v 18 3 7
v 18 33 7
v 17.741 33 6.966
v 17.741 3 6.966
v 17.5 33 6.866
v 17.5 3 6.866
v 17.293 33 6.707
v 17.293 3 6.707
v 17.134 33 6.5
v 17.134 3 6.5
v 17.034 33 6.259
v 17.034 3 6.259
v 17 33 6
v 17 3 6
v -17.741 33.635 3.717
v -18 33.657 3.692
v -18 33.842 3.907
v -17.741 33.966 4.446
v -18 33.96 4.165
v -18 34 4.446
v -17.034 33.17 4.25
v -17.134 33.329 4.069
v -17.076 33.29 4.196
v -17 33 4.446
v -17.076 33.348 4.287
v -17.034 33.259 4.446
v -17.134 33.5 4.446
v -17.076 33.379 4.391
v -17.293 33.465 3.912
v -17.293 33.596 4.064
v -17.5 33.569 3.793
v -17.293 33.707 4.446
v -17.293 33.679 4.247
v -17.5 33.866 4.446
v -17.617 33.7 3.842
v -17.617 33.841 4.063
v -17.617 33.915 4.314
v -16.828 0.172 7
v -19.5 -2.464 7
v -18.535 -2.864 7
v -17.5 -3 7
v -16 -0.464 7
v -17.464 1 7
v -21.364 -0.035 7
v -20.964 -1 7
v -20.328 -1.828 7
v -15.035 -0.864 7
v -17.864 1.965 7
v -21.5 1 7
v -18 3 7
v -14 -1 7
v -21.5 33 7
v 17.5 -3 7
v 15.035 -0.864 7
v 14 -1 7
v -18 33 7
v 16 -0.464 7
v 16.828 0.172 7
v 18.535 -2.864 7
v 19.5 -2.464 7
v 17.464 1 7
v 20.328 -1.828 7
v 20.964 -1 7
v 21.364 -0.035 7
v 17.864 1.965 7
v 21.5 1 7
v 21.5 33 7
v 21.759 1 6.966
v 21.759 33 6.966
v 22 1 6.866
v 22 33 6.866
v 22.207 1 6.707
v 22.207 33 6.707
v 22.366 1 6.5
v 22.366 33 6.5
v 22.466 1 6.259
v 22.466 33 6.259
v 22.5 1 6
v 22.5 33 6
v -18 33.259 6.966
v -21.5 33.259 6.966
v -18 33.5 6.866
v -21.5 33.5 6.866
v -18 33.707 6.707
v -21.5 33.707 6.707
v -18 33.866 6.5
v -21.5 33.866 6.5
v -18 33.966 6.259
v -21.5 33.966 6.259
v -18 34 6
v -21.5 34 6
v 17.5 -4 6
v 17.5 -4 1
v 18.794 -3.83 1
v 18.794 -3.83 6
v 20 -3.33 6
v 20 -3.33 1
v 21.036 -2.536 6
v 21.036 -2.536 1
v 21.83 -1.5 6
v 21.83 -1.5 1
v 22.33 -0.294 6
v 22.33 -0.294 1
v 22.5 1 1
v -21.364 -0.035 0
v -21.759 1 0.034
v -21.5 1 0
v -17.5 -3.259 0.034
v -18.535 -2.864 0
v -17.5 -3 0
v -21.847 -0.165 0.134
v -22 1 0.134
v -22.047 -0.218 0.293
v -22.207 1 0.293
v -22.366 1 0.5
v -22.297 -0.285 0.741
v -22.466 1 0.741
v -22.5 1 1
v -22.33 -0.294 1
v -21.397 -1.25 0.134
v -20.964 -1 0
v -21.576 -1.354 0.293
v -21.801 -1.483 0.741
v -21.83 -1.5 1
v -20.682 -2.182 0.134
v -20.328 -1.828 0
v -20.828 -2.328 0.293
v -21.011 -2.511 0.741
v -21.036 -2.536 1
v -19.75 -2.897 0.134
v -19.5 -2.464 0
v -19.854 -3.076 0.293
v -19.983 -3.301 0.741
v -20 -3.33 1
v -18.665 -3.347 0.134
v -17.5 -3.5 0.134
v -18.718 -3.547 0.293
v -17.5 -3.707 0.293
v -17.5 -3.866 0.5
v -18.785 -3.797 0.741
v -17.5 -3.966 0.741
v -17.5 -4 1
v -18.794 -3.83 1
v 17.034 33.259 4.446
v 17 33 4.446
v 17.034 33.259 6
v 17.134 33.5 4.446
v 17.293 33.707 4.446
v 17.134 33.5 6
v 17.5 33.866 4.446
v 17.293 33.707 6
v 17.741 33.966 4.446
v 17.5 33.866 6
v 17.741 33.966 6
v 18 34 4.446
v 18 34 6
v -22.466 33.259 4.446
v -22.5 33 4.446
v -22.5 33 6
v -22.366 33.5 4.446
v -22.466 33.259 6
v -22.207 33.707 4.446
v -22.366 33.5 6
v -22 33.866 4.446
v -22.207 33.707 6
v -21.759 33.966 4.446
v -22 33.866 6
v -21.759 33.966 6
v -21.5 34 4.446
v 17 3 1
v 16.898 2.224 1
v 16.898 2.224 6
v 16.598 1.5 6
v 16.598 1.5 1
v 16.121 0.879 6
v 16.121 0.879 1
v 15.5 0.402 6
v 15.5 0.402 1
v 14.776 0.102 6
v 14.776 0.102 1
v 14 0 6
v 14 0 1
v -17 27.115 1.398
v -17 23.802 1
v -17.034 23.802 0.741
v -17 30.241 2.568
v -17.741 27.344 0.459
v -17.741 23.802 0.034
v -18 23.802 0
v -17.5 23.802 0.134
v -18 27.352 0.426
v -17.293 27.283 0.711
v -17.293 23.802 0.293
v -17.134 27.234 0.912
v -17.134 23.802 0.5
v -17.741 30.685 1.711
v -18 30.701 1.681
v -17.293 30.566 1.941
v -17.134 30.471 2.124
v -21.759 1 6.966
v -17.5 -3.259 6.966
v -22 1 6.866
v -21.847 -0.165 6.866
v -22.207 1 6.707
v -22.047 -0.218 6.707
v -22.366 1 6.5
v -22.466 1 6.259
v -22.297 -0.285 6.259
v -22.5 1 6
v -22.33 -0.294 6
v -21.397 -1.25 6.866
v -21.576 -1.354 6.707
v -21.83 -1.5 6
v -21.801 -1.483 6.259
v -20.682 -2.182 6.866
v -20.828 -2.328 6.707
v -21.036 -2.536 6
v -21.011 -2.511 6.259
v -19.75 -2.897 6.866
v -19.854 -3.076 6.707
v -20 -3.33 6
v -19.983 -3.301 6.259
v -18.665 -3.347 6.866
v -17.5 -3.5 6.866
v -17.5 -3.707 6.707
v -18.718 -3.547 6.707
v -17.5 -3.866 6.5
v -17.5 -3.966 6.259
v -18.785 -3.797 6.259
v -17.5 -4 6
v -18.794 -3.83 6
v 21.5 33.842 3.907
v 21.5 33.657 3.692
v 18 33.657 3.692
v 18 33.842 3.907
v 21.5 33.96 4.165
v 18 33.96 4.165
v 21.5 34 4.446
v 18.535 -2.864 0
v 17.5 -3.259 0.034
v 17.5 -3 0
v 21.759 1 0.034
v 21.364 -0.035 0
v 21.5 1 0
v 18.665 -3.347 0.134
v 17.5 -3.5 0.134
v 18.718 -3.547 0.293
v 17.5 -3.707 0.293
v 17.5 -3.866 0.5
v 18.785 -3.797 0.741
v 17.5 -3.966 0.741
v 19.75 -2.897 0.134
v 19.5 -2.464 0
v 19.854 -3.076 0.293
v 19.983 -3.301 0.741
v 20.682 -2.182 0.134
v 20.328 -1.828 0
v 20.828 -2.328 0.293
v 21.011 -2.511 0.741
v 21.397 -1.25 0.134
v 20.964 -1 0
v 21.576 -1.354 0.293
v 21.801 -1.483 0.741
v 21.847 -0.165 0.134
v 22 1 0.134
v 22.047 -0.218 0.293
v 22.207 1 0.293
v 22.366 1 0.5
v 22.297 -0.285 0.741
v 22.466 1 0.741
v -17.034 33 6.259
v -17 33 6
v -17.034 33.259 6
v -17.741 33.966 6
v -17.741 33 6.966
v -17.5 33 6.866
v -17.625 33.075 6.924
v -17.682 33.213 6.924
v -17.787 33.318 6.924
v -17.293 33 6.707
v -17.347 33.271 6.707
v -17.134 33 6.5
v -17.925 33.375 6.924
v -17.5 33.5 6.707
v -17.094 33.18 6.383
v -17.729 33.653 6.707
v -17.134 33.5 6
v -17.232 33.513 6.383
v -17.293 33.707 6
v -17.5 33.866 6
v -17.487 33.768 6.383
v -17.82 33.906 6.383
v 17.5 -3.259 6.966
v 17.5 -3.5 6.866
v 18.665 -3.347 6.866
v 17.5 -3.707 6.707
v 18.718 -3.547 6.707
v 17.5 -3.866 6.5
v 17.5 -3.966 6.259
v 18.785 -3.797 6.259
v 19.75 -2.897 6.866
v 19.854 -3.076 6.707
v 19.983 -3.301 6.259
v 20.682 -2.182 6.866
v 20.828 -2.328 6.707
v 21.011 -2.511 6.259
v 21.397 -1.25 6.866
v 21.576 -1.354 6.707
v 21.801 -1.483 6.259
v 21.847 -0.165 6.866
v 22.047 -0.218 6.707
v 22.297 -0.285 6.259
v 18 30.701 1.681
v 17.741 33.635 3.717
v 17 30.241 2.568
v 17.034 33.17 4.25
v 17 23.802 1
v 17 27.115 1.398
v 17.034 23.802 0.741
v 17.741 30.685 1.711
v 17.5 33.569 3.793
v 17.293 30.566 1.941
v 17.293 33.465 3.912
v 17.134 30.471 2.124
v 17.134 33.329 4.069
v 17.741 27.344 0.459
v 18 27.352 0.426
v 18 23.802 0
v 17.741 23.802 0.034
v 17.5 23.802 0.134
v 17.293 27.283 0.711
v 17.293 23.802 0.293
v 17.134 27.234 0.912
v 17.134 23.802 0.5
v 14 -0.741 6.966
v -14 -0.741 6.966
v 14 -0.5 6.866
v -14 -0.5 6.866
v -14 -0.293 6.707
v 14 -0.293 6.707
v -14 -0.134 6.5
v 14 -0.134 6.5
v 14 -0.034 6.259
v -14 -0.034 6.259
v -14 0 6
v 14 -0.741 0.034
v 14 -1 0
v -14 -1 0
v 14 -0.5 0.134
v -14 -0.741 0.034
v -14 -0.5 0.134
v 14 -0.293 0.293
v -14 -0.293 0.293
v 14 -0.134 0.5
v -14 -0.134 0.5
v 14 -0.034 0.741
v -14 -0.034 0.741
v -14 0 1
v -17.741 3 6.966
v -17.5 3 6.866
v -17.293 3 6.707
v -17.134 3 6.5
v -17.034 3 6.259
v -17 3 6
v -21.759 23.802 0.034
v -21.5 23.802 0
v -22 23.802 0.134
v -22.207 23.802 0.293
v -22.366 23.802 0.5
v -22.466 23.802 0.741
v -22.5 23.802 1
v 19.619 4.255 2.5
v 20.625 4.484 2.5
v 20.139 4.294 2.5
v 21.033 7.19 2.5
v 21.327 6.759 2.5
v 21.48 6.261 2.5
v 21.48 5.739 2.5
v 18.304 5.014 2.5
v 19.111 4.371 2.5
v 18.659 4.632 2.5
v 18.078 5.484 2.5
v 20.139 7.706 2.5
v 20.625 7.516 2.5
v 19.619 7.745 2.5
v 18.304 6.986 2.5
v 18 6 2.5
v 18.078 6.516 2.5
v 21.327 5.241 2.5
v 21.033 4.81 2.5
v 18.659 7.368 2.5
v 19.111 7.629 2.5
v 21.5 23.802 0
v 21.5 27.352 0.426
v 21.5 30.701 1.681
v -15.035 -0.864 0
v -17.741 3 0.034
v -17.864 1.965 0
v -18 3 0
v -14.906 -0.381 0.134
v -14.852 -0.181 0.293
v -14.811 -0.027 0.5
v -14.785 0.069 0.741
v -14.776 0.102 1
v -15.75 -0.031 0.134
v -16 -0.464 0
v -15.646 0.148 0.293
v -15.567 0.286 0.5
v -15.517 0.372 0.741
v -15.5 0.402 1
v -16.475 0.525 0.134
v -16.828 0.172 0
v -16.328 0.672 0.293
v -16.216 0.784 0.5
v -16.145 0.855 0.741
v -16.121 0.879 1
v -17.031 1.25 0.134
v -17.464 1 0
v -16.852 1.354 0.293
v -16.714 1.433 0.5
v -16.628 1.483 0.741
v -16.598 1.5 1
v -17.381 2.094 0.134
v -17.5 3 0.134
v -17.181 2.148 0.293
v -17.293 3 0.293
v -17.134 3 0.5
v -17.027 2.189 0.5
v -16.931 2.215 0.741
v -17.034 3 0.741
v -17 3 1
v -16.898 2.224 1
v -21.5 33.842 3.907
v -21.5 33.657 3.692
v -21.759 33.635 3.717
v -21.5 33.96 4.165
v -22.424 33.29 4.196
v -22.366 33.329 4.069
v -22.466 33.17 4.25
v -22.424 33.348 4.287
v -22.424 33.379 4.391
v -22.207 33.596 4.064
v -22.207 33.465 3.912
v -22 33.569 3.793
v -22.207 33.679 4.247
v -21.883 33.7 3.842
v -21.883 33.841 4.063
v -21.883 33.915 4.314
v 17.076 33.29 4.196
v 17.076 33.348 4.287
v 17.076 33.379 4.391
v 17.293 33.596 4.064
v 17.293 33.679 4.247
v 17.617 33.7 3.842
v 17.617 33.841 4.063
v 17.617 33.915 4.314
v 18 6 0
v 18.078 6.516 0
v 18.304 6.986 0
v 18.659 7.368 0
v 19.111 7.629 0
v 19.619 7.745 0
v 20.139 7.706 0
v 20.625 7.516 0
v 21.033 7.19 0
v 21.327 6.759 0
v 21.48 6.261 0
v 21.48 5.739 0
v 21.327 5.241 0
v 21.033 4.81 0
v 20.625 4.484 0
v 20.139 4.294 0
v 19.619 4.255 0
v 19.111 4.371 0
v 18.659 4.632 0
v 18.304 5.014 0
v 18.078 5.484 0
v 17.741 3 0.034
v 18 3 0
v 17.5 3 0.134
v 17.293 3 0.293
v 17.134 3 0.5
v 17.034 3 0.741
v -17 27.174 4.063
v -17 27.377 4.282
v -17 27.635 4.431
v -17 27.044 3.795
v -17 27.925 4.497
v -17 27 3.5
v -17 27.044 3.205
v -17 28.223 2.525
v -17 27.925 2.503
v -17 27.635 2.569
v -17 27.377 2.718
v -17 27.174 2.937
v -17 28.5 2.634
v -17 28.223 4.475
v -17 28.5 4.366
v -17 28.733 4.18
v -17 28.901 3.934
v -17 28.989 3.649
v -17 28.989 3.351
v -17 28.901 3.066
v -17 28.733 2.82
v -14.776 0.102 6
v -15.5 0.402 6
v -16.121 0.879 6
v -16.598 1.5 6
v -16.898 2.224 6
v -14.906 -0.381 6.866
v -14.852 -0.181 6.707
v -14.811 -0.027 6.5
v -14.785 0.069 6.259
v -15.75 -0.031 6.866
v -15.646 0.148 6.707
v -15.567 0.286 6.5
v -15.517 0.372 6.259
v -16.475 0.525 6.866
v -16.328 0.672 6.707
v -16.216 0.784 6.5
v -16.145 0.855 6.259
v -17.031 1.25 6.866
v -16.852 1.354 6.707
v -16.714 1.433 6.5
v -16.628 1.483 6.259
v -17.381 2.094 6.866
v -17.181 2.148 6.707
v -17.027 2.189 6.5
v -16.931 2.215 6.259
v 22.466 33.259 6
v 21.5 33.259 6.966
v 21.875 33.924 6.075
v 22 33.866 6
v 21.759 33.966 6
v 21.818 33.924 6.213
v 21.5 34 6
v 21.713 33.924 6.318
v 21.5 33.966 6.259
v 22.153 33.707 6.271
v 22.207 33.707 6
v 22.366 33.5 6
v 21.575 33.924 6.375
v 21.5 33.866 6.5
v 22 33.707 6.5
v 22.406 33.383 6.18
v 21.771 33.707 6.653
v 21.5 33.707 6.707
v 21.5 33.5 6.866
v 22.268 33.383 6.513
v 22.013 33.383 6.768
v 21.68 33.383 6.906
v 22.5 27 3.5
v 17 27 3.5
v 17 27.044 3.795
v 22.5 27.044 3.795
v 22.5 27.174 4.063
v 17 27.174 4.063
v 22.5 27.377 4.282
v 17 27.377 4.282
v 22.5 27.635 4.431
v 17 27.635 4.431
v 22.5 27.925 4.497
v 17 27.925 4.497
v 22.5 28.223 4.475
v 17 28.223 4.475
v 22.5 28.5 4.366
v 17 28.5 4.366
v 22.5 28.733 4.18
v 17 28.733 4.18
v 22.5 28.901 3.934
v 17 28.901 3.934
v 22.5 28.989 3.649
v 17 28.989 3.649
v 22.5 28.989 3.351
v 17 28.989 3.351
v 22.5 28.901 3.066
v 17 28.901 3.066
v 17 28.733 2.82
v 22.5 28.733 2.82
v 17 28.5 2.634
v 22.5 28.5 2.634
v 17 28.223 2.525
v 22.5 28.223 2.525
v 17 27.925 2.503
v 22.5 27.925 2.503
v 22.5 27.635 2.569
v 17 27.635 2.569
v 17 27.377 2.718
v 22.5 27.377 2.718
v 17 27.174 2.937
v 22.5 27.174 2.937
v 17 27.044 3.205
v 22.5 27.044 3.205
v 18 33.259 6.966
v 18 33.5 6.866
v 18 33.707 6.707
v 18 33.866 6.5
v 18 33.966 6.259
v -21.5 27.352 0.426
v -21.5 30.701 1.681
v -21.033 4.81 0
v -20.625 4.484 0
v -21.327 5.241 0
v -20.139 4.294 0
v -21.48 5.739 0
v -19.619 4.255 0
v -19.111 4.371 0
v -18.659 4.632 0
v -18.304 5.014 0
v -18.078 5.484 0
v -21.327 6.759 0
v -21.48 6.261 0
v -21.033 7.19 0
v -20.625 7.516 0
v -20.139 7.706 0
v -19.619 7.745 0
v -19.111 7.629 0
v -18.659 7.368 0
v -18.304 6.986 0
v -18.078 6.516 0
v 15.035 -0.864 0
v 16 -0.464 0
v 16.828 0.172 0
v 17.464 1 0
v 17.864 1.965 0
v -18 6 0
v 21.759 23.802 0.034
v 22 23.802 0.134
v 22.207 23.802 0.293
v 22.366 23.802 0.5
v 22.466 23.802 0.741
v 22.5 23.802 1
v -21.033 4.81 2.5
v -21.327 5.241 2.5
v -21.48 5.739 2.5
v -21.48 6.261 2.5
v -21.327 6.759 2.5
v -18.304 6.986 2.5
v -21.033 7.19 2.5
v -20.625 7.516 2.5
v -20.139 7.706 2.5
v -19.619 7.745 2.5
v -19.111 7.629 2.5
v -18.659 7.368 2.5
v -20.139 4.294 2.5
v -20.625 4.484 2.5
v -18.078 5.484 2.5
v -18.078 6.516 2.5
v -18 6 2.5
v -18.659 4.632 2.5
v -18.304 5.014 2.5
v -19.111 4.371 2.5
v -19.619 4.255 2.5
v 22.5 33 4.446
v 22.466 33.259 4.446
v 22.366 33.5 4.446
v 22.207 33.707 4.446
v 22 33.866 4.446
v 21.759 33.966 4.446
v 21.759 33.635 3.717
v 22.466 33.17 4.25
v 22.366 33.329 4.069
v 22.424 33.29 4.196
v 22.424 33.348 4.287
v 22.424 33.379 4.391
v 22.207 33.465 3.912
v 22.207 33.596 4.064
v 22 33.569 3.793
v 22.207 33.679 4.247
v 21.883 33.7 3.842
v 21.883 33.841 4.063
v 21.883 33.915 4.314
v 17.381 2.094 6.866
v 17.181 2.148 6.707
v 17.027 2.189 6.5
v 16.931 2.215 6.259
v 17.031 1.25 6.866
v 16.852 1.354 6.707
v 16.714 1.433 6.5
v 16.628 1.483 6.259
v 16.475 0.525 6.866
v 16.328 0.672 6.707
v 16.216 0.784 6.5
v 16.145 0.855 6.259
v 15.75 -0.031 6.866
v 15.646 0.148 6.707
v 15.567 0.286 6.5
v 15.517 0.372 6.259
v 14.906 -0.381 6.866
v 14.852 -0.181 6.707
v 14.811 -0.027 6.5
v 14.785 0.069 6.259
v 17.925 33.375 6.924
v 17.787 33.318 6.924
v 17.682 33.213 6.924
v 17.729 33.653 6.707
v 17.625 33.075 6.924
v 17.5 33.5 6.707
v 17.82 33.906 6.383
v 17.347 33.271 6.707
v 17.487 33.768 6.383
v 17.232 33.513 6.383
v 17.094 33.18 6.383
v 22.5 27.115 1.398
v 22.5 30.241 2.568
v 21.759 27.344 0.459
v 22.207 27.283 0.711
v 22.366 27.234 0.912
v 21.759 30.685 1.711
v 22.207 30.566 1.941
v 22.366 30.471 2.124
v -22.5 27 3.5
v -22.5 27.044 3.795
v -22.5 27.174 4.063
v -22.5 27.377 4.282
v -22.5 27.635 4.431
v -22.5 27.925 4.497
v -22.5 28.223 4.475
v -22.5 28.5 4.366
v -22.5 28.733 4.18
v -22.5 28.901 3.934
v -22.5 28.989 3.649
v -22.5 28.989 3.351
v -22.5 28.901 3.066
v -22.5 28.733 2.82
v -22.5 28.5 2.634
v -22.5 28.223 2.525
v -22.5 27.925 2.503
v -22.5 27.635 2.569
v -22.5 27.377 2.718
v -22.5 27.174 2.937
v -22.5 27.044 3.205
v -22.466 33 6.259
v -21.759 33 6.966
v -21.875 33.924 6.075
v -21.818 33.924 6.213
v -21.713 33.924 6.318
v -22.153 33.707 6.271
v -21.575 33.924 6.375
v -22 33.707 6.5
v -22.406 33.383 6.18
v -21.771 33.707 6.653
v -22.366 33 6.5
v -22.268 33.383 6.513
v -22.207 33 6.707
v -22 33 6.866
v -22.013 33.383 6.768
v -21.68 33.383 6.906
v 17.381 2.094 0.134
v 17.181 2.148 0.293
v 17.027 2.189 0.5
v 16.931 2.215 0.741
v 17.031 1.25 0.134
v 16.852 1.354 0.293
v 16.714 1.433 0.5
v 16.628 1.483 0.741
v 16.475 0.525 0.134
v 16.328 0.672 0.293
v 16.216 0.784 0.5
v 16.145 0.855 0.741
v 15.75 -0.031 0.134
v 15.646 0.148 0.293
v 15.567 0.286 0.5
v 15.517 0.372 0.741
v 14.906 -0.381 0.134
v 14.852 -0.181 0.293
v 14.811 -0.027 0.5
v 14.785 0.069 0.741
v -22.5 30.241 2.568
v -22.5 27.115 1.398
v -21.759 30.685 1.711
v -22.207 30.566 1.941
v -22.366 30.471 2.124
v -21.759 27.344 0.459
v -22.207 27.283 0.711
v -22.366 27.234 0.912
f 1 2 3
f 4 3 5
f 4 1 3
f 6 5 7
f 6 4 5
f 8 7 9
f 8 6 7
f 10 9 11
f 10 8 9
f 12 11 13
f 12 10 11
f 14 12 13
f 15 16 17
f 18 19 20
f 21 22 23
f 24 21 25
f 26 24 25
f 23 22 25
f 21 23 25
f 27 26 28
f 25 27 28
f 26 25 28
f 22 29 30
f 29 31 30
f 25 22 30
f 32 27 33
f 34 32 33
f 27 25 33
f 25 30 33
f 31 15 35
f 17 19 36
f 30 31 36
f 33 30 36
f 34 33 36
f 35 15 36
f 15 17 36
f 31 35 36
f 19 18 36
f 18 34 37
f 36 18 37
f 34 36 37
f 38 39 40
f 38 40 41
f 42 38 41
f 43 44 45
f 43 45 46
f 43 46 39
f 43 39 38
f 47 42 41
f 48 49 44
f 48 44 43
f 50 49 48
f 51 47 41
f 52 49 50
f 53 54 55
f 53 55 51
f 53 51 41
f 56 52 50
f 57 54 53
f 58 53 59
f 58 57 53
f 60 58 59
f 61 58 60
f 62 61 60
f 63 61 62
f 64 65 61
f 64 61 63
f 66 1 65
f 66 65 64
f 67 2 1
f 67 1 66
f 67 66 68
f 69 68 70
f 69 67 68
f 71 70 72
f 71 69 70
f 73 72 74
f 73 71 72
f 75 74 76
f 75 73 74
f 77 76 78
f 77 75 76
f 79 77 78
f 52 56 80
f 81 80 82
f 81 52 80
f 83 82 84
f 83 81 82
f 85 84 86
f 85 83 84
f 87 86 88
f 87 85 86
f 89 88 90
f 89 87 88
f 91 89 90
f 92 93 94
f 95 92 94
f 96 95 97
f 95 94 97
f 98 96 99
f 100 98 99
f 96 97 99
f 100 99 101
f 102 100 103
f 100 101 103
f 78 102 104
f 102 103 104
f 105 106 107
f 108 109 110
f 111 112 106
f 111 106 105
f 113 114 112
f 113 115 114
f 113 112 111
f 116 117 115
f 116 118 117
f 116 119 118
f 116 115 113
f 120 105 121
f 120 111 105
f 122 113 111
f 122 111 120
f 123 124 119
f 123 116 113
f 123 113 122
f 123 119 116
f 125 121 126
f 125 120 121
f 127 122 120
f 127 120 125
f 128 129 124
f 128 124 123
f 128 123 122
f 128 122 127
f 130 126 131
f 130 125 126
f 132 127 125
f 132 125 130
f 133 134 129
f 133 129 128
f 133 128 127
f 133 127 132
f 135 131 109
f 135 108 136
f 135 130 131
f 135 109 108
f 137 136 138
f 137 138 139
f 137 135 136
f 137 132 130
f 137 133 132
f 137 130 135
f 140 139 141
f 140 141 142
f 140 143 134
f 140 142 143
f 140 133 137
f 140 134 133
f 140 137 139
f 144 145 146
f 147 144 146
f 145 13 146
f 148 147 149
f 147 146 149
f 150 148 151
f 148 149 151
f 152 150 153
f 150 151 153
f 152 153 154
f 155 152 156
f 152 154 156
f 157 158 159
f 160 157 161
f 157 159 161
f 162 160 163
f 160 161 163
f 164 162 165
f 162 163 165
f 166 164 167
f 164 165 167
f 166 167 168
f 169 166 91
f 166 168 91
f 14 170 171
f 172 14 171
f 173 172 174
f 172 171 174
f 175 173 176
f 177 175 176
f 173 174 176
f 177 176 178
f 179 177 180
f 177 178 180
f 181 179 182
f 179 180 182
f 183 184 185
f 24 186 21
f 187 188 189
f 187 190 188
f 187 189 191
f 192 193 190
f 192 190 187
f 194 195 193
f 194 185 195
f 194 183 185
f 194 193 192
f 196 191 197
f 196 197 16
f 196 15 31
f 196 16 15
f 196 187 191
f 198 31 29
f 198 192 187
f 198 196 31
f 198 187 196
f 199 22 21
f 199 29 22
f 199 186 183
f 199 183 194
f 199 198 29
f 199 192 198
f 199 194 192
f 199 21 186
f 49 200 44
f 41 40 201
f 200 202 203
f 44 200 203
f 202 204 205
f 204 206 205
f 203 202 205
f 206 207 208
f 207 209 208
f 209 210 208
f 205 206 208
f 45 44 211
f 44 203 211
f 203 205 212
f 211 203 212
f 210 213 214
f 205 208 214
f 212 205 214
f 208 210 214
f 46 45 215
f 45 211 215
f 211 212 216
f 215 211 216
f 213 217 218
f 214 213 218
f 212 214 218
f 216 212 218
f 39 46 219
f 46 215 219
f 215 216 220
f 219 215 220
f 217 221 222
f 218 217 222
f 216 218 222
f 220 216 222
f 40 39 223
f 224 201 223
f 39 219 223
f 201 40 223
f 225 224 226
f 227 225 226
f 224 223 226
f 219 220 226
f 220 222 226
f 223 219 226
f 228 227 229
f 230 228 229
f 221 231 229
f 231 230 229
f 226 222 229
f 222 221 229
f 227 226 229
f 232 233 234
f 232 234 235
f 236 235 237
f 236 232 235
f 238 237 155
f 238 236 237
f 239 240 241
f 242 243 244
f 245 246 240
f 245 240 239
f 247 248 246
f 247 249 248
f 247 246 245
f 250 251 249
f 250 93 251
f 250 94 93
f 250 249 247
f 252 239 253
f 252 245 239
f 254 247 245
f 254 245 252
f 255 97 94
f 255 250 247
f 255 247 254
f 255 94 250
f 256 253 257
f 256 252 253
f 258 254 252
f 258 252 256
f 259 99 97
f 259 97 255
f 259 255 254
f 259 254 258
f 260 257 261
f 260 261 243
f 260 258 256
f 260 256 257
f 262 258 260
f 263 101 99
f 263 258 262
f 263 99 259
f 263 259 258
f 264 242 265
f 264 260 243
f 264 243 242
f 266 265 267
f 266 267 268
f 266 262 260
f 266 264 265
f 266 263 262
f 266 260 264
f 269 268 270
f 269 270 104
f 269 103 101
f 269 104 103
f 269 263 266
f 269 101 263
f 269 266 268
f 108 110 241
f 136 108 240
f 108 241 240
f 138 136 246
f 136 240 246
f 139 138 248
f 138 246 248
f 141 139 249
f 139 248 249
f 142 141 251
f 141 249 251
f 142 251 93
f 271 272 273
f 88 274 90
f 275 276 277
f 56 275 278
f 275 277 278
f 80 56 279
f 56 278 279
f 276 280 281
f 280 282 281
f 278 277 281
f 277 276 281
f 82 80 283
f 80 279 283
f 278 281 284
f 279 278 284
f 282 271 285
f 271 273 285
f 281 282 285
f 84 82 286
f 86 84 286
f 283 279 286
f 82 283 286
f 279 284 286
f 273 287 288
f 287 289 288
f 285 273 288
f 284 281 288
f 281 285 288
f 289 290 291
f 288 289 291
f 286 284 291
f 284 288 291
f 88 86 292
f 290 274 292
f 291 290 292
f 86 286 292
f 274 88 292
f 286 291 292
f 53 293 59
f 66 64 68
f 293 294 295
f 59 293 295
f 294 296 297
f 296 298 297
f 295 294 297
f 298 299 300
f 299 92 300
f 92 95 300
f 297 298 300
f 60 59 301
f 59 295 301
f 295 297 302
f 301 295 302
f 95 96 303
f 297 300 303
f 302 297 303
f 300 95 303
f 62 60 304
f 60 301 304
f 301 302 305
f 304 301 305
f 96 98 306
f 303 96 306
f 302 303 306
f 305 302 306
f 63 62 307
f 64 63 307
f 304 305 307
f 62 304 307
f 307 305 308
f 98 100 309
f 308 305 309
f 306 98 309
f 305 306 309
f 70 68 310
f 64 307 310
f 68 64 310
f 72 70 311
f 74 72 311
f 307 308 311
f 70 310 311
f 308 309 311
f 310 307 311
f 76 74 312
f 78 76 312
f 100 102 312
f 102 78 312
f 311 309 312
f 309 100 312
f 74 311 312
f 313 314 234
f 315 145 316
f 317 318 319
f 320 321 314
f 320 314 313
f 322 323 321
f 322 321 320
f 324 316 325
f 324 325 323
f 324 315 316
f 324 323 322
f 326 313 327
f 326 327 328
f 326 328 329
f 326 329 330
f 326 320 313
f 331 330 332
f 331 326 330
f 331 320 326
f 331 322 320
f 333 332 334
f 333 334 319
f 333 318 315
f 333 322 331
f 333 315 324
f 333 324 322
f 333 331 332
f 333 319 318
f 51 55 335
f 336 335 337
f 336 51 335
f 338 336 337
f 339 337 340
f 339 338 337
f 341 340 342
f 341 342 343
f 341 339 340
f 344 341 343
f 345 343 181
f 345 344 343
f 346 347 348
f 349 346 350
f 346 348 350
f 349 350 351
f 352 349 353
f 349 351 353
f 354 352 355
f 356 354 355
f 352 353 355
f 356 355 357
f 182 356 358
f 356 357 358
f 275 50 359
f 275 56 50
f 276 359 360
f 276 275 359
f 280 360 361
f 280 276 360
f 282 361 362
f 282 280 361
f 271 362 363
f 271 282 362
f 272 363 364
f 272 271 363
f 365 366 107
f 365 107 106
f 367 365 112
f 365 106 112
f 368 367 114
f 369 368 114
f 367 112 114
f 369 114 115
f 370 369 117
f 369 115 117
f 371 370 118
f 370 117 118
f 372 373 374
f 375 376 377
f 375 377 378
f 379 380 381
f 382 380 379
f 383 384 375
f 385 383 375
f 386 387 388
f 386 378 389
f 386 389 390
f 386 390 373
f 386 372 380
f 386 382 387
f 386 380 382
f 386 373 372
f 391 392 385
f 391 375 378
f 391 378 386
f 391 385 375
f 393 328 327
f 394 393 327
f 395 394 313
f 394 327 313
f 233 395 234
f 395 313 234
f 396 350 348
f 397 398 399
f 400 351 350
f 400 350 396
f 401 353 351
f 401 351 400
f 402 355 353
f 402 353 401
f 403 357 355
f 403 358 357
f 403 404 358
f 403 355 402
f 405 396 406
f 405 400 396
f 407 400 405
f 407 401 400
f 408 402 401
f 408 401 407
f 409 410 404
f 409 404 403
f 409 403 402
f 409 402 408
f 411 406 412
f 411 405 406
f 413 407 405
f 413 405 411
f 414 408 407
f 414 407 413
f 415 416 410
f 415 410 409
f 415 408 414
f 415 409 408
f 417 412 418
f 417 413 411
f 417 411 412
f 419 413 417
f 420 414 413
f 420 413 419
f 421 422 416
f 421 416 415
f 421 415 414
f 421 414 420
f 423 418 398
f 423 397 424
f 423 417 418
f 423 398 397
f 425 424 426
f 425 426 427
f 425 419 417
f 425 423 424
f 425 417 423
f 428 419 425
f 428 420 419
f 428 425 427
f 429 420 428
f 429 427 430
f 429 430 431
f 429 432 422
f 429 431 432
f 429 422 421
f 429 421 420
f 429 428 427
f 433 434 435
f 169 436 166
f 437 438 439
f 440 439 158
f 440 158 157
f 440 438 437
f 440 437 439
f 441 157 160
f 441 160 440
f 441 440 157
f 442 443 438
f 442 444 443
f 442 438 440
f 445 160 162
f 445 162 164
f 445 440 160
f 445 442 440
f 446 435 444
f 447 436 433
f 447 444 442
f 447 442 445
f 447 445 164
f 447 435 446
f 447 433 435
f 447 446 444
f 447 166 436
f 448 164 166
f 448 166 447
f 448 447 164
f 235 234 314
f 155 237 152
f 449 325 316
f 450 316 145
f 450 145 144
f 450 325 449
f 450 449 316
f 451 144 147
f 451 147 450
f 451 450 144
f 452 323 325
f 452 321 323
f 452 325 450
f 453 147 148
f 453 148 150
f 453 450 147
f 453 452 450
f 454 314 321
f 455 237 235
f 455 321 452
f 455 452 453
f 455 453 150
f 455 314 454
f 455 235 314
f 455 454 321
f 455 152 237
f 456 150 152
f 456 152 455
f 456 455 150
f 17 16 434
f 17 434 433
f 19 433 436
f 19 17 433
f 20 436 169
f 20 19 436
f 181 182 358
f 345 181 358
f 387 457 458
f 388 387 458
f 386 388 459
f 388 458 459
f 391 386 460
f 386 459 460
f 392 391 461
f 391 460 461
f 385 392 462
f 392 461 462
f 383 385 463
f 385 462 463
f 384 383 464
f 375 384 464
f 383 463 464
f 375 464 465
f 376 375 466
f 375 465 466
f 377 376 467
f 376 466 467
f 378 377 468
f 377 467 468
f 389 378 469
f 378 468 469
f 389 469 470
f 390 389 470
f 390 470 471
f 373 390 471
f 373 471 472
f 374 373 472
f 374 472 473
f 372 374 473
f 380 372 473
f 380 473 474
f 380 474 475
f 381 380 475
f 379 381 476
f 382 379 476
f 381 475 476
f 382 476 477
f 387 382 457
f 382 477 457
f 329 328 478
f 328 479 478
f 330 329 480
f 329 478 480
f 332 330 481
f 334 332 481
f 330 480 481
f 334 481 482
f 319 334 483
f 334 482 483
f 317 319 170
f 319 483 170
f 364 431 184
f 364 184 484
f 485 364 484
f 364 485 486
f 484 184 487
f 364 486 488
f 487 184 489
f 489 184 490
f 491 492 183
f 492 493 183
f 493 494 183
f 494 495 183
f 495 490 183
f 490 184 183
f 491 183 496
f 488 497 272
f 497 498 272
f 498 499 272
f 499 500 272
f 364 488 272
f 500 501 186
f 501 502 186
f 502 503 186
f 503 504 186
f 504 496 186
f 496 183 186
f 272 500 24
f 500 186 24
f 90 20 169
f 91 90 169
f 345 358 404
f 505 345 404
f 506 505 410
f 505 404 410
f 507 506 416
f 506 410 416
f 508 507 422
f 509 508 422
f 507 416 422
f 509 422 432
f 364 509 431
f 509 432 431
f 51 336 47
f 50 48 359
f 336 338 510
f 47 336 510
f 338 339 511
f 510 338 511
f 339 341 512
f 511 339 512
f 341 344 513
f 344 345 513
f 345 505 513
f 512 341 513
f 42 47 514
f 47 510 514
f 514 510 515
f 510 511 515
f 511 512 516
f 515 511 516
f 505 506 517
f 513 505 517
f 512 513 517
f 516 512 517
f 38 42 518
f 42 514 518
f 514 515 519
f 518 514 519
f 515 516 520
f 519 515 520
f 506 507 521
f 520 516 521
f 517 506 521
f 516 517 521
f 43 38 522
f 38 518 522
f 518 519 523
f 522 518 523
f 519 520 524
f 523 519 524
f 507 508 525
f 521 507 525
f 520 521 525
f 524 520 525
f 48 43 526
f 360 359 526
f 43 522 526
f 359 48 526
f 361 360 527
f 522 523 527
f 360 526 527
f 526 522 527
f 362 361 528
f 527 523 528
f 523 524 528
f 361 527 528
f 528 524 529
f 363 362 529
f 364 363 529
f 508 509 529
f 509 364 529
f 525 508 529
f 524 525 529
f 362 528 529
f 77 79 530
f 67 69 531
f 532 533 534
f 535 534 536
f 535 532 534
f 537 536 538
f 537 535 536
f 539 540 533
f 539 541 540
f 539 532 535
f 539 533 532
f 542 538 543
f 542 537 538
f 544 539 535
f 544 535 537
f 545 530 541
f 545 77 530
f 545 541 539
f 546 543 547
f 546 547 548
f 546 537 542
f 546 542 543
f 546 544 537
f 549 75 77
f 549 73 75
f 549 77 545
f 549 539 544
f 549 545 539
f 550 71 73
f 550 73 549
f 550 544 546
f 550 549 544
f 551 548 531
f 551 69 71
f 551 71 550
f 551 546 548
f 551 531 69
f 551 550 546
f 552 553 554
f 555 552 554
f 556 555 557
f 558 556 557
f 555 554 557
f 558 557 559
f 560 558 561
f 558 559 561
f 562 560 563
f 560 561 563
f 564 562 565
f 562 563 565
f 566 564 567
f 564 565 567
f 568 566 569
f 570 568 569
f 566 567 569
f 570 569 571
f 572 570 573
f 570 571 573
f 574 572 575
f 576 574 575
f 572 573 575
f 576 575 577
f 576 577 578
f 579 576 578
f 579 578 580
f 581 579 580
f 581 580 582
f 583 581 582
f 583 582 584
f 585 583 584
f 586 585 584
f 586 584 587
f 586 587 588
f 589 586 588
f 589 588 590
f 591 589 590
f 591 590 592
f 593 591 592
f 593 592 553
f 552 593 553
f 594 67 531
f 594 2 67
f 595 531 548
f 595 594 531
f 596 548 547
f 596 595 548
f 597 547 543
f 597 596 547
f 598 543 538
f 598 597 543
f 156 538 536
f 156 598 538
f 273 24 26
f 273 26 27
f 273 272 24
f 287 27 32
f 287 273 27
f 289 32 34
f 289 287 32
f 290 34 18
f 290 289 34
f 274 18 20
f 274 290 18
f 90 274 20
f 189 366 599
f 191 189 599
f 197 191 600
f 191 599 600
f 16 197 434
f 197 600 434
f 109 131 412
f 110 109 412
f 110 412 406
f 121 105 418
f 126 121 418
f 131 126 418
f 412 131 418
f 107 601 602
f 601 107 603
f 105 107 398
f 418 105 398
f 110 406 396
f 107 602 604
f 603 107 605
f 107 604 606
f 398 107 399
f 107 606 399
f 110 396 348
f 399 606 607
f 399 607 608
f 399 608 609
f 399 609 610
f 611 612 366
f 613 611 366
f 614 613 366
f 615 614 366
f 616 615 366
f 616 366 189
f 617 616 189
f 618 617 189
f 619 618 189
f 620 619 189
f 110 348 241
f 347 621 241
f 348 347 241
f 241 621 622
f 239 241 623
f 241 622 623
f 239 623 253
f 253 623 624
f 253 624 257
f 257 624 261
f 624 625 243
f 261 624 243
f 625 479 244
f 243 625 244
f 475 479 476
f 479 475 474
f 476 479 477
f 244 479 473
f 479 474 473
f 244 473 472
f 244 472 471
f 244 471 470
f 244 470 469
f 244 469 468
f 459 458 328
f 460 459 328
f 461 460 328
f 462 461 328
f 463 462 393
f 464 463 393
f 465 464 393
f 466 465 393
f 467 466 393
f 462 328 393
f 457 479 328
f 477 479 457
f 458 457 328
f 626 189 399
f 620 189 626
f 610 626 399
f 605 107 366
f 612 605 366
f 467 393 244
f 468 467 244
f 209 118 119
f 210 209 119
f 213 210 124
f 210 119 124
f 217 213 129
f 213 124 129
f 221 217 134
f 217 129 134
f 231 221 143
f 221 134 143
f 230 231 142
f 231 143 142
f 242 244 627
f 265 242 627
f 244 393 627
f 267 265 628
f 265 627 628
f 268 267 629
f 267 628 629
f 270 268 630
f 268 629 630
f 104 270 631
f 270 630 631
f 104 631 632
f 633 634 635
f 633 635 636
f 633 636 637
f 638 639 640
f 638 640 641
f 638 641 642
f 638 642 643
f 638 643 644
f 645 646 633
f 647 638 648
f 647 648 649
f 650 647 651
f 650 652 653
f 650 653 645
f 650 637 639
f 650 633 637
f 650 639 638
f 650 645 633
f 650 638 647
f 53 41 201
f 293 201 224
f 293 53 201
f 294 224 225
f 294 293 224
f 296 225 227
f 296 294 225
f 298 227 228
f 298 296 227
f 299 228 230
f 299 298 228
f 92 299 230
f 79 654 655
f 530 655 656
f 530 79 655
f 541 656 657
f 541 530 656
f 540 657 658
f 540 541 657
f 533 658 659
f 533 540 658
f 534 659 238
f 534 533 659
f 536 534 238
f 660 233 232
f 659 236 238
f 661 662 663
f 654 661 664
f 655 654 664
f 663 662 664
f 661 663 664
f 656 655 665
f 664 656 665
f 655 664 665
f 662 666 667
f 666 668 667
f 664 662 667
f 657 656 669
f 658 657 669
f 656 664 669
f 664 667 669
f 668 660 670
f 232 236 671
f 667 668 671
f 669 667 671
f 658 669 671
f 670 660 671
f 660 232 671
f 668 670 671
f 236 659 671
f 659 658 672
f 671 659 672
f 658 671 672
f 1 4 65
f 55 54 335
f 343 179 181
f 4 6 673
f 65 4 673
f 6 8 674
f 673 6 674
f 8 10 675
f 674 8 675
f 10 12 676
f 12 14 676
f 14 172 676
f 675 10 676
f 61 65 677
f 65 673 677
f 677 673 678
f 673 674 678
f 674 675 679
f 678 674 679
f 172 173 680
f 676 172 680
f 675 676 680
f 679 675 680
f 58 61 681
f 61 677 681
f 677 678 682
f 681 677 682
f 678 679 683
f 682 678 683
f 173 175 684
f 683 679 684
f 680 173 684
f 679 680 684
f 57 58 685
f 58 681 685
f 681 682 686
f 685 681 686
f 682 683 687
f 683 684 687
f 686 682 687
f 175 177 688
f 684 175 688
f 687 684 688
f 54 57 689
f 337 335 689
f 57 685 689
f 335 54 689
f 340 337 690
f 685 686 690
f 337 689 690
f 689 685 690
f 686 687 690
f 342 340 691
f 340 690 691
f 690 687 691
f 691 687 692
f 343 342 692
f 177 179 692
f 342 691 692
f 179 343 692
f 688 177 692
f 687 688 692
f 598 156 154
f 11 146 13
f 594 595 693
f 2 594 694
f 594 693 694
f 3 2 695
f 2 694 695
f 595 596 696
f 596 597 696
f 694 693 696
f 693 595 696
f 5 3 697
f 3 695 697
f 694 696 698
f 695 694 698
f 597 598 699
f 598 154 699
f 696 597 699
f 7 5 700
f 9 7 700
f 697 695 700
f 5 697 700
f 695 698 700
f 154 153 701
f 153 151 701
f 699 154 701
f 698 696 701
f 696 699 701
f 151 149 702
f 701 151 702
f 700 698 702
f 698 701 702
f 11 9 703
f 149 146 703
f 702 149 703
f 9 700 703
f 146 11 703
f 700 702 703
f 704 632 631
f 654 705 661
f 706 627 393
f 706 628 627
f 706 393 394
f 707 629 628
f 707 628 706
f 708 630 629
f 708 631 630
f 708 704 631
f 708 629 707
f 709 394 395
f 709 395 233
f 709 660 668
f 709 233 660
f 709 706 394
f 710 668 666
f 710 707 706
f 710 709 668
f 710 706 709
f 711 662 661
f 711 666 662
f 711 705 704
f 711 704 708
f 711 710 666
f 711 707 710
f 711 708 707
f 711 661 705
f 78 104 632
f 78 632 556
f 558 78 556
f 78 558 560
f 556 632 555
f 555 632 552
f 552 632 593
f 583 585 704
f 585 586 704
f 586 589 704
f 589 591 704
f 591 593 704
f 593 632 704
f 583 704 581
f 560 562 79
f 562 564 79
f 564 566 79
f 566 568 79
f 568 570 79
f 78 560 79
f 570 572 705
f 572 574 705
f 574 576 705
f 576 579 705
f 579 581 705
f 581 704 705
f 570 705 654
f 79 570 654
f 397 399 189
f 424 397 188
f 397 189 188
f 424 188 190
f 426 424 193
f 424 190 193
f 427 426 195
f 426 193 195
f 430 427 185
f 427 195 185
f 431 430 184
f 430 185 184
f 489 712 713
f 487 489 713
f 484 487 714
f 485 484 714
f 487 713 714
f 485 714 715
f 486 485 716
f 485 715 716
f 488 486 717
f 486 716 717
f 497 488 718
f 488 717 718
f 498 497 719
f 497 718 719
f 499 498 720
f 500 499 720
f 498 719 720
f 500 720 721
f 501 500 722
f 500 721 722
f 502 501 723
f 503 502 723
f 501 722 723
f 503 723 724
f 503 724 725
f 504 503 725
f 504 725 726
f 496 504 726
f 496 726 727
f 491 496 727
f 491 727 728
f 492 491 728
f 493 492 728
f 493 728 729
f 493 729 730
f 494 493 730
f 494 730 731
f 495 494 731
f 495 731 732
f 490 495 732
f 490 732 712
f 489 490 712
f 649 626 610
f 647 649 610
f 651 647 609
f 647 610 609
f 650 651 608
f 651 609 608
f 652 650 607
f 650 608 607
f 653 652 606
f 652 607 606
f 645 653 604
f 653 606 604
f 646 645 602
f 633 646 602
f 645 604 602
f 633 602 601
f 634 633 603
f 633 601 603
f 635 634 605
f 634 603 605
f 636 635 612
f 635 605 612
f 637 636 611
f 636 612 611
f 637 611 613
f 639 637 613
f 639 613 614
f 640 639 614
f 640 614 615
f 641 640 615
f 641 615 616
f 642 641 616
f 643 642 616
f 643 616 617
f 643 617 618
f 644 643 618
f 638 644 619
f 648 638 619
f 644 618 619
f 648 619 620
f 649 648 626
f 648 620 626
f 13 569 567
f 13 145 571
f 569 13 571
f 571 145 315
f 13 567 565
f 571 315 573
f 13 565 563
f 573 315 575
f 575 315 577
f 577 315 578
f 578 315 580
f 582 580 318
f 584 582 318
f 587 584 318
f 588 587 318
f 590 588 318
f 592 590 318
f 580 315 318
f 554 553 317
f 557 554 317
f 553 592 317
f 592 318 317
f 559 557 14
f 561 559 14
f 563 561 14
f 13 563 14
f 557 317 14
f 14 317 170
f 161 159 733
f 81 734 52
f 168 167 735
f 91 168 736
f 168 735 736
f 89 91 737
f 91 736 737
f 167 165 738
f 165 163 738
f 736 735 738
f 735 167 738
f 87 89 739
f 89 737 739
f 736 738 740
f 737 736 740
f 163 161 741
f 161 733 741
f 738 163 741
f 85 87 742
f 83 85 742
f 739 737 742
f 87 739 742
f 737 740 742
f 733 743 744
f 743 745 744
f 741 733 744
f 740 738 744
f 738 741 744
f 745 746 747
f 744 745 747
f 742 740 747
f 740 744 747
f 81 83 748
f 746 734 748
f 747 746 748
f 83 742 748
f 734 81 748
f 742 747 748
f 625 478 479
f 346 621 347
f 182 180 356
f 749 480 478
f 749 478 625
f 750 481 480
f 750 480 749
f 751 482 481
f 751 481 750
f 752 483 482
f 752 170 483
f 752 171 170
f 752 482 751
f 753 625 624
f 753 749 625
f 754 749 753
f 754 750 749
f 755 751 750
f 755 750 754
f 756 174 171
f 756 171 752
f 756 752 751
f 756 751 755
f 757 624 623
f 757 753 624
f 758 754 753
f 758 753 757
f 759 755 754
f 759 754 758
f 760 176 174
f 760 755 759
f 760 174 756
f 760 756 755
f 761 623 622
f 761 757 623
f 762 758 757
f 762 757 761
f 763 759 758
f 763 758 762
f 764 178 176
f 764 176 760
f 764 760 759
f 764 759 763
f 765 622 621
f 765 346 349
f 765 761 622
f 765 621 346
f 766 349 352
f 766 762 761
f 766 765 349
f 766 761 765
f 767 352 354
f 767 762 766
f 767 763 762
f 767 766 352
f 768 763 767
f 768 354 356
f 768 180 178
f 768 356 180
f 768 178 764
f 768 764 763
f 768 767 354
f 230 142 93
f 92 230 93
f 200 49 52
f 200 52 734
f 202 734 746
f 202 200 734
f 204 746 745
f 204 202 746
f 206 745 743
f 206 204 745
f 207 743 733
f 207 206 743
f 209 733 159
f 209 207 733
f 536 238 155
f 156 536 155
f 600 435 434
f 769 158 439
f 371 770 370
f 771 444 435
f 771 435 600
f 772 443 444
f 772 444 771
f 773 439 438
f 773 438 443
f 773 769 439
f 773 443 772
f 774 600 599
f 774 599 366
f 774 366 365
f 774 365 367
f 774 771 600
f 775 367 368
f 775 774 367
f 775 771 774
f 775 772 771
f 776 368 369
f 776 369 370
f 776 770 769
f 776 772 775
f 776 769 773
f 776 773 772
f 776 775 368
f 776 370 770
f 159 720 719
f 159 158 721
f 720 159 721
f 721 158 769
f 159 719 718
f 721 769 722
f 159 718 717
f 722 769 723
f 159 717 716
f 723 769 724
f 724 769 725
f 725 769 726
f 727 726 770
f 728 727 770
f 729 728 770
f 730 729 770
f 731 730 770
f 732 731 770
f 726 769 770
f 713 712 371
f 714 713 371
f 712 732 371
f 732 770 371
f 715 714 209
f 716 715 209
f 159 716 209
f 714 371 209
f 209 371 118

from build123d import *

# Parameters (mm, degrees)
EXTRUDE_1_DEPTH     = 7
SKETCH_3_R          = 1
CUT_EXTRUDE_2_DEPTH = 57.833088954
SKETCH_4_R          = 1.75
CUT_EXTRUDE_3_DEPTH = 2.5
CUT_EXTRUDE_1_DEPTH = 57.833088954
FILLET_2_R          = 15
FILLET_3_R          = 1


# Some blends are built 0.0001 mm under size
with BuildPart() as part:
    # 草图1 → 凸台-拉伸1 (new body)
    with BuildSketch(Plane.XY):
        with BuildLine():
            Line((14, 0), (-14, 0))
            ThreePointArc((-14, 0), (-16.121320344, 0.878679656), (-17, 3))
            Line((-17, 3), (-17, 34))
            Line((-17, 34), (-22.5, 34))
            Line((-22.5, 34), (-22.5, 1))
            ThreePointArc((-22.5, 1), (-21.035533906, -2.535533906), (-17.5, -4))
            Line((-17.5, -4), (17.5, -4))
            ThreePointArc((17.5, -4), (21.035533906, -2.535533906), (22.5, 1))
            Line((22.5, 1), (22.5, 34))
            Line((22.5, 34), (17, 34))
            Line((17, 34), (17, 3))
            ThreePointArc((17, 3), (16.121320344, 0.878679656), (14, 0))
        make_face()
    extrude(amount=EXTRUDE_1_DEPTH)

    # 草图3 → 切除-拉伸2 (cut, through all)
    with BuildSketch(Plane.ZY.offset(22.5)):
        with Locations(Location((3.5, 28, 0), (0, 0, 270))):
            Circle(SKETCH_3_R)
    extrude(amount=-CUT_EXTRUDE_2_DEPTH, mode=Mode.SUBTRACT)

    # 草图4 → 切除-拉伸3 (cut)
    with BuildSketch(Plane(origin=(0, 0, 0), x_dir=(-1, 0, 0), z_dir=(0, 0, -1))):
        with Locations((-19.75, 6)):
            Circle(SKETCH_4_R)
        with Locations(Location((19.75, 6, 0), (0, 0, 180))):
            Circle(SKETCH_4_R)
    extrude(amount=-CUT_EXTRUDE_3_DEPTH, mode=Mode.SUBTRACT)

    # 草图2 → 切除-拉伸1 (cut, through all)
    with BuildSketch(Plane.ZY.offset(22.5)):
        Polygon((0, 30), (4, 34), (7, 34), (7, 35.188575271), (0, 35.188575271), align=None)
    extrude(amount=-CUT_EXTRUDE_1_DEPTH, mode=Mode.SUBTRACT)

    # 圆角2
    # the kernel refuses this fillet: 15 mm, written as the material it takes off along each edge
    with BuildSketch(Plane(origin=(-37.995097568, 30, 0), x_dir=(0, -1, 0), z_dir=(1, 0, 0)), Plane(origin=(1.504902432, 30, 0), x_dir=(0, -1, 0), z_dir=(1, 0, 0))) as fillet_2_piece_1:
        with BuildLine():
            CenterArc((6.198039027, -15), FILLET_2_R, 90, 42.833428066)
            Line((-4, -4), (-4.203960781, -3.78))
            ThreePointArc((-4.203960781, -3.78), (-2.212132034, -1.787867966), (-0.212132034, 0.212132034))
            Line((-0.212132034, 0.212132034), (0, 0.3))
            Line((0, 0.3), (6.198039027, 0.3))
            Line((6.198039027, 0.3), (6.198039027, 0))
        make_face()
    extrude(amount=36.490195136, mode=Mode.SUBTRACT)

    # 圆角3
    fillet_3_edges = [part.edges().sort_by_distance(p)[0] for p in [
        (-17, 13.400980486, 0),
        (-16.121320344, 0.878679656, 0),
        (-21.035533906, -2.535533906, 7),
        (0, 0, 0),
        (16.121320344, 0.878679656, 0),
        (22.5, 12.400980486, 0),
        (21.035533906, -2.535533906, 0),
        (0, -4, 0),
        (-21.035533906, -2.535533906, 0),
        (0, -4, 7),
        (-17, 34, 5.5),
        (21.035533906, -2.535533906, 7),
        (17, 34, 5.5),
        (22.5, 34, 5.5),
        (-22.5, 34, 5.5),
        (22.5, 17.5, 7),
        (19.75, 34, 7),
        (17, 18.5, 7),
        (16.121320344, 0.878679656, 7),
        (0, 0, 7),
        (-16.121320344, 0.878679656, 7),
        (-17, 18.5, 7),
        (-19.75, 34, 7),
        (19.75, 34, 4),
        (-19.75, 34, 4),
        (17, 13.400980486, 0),
        (17, 29.279186548, 1.035759956),
        (-22.5, 12.400980486, 0),
        (22.5, 29.279186548, 1.035759956),
        (-17, 29.279186548, 1.035759956),
        (-22.5, 29.279186548, 1.035759956),
        (-22.5, 17.5, 7),
    ]]
    fillet(fillet_3_edges, radius=FILLET_3_R - 0.0001)  # a hair under: the kernel refuses the full size


solid = part.part
